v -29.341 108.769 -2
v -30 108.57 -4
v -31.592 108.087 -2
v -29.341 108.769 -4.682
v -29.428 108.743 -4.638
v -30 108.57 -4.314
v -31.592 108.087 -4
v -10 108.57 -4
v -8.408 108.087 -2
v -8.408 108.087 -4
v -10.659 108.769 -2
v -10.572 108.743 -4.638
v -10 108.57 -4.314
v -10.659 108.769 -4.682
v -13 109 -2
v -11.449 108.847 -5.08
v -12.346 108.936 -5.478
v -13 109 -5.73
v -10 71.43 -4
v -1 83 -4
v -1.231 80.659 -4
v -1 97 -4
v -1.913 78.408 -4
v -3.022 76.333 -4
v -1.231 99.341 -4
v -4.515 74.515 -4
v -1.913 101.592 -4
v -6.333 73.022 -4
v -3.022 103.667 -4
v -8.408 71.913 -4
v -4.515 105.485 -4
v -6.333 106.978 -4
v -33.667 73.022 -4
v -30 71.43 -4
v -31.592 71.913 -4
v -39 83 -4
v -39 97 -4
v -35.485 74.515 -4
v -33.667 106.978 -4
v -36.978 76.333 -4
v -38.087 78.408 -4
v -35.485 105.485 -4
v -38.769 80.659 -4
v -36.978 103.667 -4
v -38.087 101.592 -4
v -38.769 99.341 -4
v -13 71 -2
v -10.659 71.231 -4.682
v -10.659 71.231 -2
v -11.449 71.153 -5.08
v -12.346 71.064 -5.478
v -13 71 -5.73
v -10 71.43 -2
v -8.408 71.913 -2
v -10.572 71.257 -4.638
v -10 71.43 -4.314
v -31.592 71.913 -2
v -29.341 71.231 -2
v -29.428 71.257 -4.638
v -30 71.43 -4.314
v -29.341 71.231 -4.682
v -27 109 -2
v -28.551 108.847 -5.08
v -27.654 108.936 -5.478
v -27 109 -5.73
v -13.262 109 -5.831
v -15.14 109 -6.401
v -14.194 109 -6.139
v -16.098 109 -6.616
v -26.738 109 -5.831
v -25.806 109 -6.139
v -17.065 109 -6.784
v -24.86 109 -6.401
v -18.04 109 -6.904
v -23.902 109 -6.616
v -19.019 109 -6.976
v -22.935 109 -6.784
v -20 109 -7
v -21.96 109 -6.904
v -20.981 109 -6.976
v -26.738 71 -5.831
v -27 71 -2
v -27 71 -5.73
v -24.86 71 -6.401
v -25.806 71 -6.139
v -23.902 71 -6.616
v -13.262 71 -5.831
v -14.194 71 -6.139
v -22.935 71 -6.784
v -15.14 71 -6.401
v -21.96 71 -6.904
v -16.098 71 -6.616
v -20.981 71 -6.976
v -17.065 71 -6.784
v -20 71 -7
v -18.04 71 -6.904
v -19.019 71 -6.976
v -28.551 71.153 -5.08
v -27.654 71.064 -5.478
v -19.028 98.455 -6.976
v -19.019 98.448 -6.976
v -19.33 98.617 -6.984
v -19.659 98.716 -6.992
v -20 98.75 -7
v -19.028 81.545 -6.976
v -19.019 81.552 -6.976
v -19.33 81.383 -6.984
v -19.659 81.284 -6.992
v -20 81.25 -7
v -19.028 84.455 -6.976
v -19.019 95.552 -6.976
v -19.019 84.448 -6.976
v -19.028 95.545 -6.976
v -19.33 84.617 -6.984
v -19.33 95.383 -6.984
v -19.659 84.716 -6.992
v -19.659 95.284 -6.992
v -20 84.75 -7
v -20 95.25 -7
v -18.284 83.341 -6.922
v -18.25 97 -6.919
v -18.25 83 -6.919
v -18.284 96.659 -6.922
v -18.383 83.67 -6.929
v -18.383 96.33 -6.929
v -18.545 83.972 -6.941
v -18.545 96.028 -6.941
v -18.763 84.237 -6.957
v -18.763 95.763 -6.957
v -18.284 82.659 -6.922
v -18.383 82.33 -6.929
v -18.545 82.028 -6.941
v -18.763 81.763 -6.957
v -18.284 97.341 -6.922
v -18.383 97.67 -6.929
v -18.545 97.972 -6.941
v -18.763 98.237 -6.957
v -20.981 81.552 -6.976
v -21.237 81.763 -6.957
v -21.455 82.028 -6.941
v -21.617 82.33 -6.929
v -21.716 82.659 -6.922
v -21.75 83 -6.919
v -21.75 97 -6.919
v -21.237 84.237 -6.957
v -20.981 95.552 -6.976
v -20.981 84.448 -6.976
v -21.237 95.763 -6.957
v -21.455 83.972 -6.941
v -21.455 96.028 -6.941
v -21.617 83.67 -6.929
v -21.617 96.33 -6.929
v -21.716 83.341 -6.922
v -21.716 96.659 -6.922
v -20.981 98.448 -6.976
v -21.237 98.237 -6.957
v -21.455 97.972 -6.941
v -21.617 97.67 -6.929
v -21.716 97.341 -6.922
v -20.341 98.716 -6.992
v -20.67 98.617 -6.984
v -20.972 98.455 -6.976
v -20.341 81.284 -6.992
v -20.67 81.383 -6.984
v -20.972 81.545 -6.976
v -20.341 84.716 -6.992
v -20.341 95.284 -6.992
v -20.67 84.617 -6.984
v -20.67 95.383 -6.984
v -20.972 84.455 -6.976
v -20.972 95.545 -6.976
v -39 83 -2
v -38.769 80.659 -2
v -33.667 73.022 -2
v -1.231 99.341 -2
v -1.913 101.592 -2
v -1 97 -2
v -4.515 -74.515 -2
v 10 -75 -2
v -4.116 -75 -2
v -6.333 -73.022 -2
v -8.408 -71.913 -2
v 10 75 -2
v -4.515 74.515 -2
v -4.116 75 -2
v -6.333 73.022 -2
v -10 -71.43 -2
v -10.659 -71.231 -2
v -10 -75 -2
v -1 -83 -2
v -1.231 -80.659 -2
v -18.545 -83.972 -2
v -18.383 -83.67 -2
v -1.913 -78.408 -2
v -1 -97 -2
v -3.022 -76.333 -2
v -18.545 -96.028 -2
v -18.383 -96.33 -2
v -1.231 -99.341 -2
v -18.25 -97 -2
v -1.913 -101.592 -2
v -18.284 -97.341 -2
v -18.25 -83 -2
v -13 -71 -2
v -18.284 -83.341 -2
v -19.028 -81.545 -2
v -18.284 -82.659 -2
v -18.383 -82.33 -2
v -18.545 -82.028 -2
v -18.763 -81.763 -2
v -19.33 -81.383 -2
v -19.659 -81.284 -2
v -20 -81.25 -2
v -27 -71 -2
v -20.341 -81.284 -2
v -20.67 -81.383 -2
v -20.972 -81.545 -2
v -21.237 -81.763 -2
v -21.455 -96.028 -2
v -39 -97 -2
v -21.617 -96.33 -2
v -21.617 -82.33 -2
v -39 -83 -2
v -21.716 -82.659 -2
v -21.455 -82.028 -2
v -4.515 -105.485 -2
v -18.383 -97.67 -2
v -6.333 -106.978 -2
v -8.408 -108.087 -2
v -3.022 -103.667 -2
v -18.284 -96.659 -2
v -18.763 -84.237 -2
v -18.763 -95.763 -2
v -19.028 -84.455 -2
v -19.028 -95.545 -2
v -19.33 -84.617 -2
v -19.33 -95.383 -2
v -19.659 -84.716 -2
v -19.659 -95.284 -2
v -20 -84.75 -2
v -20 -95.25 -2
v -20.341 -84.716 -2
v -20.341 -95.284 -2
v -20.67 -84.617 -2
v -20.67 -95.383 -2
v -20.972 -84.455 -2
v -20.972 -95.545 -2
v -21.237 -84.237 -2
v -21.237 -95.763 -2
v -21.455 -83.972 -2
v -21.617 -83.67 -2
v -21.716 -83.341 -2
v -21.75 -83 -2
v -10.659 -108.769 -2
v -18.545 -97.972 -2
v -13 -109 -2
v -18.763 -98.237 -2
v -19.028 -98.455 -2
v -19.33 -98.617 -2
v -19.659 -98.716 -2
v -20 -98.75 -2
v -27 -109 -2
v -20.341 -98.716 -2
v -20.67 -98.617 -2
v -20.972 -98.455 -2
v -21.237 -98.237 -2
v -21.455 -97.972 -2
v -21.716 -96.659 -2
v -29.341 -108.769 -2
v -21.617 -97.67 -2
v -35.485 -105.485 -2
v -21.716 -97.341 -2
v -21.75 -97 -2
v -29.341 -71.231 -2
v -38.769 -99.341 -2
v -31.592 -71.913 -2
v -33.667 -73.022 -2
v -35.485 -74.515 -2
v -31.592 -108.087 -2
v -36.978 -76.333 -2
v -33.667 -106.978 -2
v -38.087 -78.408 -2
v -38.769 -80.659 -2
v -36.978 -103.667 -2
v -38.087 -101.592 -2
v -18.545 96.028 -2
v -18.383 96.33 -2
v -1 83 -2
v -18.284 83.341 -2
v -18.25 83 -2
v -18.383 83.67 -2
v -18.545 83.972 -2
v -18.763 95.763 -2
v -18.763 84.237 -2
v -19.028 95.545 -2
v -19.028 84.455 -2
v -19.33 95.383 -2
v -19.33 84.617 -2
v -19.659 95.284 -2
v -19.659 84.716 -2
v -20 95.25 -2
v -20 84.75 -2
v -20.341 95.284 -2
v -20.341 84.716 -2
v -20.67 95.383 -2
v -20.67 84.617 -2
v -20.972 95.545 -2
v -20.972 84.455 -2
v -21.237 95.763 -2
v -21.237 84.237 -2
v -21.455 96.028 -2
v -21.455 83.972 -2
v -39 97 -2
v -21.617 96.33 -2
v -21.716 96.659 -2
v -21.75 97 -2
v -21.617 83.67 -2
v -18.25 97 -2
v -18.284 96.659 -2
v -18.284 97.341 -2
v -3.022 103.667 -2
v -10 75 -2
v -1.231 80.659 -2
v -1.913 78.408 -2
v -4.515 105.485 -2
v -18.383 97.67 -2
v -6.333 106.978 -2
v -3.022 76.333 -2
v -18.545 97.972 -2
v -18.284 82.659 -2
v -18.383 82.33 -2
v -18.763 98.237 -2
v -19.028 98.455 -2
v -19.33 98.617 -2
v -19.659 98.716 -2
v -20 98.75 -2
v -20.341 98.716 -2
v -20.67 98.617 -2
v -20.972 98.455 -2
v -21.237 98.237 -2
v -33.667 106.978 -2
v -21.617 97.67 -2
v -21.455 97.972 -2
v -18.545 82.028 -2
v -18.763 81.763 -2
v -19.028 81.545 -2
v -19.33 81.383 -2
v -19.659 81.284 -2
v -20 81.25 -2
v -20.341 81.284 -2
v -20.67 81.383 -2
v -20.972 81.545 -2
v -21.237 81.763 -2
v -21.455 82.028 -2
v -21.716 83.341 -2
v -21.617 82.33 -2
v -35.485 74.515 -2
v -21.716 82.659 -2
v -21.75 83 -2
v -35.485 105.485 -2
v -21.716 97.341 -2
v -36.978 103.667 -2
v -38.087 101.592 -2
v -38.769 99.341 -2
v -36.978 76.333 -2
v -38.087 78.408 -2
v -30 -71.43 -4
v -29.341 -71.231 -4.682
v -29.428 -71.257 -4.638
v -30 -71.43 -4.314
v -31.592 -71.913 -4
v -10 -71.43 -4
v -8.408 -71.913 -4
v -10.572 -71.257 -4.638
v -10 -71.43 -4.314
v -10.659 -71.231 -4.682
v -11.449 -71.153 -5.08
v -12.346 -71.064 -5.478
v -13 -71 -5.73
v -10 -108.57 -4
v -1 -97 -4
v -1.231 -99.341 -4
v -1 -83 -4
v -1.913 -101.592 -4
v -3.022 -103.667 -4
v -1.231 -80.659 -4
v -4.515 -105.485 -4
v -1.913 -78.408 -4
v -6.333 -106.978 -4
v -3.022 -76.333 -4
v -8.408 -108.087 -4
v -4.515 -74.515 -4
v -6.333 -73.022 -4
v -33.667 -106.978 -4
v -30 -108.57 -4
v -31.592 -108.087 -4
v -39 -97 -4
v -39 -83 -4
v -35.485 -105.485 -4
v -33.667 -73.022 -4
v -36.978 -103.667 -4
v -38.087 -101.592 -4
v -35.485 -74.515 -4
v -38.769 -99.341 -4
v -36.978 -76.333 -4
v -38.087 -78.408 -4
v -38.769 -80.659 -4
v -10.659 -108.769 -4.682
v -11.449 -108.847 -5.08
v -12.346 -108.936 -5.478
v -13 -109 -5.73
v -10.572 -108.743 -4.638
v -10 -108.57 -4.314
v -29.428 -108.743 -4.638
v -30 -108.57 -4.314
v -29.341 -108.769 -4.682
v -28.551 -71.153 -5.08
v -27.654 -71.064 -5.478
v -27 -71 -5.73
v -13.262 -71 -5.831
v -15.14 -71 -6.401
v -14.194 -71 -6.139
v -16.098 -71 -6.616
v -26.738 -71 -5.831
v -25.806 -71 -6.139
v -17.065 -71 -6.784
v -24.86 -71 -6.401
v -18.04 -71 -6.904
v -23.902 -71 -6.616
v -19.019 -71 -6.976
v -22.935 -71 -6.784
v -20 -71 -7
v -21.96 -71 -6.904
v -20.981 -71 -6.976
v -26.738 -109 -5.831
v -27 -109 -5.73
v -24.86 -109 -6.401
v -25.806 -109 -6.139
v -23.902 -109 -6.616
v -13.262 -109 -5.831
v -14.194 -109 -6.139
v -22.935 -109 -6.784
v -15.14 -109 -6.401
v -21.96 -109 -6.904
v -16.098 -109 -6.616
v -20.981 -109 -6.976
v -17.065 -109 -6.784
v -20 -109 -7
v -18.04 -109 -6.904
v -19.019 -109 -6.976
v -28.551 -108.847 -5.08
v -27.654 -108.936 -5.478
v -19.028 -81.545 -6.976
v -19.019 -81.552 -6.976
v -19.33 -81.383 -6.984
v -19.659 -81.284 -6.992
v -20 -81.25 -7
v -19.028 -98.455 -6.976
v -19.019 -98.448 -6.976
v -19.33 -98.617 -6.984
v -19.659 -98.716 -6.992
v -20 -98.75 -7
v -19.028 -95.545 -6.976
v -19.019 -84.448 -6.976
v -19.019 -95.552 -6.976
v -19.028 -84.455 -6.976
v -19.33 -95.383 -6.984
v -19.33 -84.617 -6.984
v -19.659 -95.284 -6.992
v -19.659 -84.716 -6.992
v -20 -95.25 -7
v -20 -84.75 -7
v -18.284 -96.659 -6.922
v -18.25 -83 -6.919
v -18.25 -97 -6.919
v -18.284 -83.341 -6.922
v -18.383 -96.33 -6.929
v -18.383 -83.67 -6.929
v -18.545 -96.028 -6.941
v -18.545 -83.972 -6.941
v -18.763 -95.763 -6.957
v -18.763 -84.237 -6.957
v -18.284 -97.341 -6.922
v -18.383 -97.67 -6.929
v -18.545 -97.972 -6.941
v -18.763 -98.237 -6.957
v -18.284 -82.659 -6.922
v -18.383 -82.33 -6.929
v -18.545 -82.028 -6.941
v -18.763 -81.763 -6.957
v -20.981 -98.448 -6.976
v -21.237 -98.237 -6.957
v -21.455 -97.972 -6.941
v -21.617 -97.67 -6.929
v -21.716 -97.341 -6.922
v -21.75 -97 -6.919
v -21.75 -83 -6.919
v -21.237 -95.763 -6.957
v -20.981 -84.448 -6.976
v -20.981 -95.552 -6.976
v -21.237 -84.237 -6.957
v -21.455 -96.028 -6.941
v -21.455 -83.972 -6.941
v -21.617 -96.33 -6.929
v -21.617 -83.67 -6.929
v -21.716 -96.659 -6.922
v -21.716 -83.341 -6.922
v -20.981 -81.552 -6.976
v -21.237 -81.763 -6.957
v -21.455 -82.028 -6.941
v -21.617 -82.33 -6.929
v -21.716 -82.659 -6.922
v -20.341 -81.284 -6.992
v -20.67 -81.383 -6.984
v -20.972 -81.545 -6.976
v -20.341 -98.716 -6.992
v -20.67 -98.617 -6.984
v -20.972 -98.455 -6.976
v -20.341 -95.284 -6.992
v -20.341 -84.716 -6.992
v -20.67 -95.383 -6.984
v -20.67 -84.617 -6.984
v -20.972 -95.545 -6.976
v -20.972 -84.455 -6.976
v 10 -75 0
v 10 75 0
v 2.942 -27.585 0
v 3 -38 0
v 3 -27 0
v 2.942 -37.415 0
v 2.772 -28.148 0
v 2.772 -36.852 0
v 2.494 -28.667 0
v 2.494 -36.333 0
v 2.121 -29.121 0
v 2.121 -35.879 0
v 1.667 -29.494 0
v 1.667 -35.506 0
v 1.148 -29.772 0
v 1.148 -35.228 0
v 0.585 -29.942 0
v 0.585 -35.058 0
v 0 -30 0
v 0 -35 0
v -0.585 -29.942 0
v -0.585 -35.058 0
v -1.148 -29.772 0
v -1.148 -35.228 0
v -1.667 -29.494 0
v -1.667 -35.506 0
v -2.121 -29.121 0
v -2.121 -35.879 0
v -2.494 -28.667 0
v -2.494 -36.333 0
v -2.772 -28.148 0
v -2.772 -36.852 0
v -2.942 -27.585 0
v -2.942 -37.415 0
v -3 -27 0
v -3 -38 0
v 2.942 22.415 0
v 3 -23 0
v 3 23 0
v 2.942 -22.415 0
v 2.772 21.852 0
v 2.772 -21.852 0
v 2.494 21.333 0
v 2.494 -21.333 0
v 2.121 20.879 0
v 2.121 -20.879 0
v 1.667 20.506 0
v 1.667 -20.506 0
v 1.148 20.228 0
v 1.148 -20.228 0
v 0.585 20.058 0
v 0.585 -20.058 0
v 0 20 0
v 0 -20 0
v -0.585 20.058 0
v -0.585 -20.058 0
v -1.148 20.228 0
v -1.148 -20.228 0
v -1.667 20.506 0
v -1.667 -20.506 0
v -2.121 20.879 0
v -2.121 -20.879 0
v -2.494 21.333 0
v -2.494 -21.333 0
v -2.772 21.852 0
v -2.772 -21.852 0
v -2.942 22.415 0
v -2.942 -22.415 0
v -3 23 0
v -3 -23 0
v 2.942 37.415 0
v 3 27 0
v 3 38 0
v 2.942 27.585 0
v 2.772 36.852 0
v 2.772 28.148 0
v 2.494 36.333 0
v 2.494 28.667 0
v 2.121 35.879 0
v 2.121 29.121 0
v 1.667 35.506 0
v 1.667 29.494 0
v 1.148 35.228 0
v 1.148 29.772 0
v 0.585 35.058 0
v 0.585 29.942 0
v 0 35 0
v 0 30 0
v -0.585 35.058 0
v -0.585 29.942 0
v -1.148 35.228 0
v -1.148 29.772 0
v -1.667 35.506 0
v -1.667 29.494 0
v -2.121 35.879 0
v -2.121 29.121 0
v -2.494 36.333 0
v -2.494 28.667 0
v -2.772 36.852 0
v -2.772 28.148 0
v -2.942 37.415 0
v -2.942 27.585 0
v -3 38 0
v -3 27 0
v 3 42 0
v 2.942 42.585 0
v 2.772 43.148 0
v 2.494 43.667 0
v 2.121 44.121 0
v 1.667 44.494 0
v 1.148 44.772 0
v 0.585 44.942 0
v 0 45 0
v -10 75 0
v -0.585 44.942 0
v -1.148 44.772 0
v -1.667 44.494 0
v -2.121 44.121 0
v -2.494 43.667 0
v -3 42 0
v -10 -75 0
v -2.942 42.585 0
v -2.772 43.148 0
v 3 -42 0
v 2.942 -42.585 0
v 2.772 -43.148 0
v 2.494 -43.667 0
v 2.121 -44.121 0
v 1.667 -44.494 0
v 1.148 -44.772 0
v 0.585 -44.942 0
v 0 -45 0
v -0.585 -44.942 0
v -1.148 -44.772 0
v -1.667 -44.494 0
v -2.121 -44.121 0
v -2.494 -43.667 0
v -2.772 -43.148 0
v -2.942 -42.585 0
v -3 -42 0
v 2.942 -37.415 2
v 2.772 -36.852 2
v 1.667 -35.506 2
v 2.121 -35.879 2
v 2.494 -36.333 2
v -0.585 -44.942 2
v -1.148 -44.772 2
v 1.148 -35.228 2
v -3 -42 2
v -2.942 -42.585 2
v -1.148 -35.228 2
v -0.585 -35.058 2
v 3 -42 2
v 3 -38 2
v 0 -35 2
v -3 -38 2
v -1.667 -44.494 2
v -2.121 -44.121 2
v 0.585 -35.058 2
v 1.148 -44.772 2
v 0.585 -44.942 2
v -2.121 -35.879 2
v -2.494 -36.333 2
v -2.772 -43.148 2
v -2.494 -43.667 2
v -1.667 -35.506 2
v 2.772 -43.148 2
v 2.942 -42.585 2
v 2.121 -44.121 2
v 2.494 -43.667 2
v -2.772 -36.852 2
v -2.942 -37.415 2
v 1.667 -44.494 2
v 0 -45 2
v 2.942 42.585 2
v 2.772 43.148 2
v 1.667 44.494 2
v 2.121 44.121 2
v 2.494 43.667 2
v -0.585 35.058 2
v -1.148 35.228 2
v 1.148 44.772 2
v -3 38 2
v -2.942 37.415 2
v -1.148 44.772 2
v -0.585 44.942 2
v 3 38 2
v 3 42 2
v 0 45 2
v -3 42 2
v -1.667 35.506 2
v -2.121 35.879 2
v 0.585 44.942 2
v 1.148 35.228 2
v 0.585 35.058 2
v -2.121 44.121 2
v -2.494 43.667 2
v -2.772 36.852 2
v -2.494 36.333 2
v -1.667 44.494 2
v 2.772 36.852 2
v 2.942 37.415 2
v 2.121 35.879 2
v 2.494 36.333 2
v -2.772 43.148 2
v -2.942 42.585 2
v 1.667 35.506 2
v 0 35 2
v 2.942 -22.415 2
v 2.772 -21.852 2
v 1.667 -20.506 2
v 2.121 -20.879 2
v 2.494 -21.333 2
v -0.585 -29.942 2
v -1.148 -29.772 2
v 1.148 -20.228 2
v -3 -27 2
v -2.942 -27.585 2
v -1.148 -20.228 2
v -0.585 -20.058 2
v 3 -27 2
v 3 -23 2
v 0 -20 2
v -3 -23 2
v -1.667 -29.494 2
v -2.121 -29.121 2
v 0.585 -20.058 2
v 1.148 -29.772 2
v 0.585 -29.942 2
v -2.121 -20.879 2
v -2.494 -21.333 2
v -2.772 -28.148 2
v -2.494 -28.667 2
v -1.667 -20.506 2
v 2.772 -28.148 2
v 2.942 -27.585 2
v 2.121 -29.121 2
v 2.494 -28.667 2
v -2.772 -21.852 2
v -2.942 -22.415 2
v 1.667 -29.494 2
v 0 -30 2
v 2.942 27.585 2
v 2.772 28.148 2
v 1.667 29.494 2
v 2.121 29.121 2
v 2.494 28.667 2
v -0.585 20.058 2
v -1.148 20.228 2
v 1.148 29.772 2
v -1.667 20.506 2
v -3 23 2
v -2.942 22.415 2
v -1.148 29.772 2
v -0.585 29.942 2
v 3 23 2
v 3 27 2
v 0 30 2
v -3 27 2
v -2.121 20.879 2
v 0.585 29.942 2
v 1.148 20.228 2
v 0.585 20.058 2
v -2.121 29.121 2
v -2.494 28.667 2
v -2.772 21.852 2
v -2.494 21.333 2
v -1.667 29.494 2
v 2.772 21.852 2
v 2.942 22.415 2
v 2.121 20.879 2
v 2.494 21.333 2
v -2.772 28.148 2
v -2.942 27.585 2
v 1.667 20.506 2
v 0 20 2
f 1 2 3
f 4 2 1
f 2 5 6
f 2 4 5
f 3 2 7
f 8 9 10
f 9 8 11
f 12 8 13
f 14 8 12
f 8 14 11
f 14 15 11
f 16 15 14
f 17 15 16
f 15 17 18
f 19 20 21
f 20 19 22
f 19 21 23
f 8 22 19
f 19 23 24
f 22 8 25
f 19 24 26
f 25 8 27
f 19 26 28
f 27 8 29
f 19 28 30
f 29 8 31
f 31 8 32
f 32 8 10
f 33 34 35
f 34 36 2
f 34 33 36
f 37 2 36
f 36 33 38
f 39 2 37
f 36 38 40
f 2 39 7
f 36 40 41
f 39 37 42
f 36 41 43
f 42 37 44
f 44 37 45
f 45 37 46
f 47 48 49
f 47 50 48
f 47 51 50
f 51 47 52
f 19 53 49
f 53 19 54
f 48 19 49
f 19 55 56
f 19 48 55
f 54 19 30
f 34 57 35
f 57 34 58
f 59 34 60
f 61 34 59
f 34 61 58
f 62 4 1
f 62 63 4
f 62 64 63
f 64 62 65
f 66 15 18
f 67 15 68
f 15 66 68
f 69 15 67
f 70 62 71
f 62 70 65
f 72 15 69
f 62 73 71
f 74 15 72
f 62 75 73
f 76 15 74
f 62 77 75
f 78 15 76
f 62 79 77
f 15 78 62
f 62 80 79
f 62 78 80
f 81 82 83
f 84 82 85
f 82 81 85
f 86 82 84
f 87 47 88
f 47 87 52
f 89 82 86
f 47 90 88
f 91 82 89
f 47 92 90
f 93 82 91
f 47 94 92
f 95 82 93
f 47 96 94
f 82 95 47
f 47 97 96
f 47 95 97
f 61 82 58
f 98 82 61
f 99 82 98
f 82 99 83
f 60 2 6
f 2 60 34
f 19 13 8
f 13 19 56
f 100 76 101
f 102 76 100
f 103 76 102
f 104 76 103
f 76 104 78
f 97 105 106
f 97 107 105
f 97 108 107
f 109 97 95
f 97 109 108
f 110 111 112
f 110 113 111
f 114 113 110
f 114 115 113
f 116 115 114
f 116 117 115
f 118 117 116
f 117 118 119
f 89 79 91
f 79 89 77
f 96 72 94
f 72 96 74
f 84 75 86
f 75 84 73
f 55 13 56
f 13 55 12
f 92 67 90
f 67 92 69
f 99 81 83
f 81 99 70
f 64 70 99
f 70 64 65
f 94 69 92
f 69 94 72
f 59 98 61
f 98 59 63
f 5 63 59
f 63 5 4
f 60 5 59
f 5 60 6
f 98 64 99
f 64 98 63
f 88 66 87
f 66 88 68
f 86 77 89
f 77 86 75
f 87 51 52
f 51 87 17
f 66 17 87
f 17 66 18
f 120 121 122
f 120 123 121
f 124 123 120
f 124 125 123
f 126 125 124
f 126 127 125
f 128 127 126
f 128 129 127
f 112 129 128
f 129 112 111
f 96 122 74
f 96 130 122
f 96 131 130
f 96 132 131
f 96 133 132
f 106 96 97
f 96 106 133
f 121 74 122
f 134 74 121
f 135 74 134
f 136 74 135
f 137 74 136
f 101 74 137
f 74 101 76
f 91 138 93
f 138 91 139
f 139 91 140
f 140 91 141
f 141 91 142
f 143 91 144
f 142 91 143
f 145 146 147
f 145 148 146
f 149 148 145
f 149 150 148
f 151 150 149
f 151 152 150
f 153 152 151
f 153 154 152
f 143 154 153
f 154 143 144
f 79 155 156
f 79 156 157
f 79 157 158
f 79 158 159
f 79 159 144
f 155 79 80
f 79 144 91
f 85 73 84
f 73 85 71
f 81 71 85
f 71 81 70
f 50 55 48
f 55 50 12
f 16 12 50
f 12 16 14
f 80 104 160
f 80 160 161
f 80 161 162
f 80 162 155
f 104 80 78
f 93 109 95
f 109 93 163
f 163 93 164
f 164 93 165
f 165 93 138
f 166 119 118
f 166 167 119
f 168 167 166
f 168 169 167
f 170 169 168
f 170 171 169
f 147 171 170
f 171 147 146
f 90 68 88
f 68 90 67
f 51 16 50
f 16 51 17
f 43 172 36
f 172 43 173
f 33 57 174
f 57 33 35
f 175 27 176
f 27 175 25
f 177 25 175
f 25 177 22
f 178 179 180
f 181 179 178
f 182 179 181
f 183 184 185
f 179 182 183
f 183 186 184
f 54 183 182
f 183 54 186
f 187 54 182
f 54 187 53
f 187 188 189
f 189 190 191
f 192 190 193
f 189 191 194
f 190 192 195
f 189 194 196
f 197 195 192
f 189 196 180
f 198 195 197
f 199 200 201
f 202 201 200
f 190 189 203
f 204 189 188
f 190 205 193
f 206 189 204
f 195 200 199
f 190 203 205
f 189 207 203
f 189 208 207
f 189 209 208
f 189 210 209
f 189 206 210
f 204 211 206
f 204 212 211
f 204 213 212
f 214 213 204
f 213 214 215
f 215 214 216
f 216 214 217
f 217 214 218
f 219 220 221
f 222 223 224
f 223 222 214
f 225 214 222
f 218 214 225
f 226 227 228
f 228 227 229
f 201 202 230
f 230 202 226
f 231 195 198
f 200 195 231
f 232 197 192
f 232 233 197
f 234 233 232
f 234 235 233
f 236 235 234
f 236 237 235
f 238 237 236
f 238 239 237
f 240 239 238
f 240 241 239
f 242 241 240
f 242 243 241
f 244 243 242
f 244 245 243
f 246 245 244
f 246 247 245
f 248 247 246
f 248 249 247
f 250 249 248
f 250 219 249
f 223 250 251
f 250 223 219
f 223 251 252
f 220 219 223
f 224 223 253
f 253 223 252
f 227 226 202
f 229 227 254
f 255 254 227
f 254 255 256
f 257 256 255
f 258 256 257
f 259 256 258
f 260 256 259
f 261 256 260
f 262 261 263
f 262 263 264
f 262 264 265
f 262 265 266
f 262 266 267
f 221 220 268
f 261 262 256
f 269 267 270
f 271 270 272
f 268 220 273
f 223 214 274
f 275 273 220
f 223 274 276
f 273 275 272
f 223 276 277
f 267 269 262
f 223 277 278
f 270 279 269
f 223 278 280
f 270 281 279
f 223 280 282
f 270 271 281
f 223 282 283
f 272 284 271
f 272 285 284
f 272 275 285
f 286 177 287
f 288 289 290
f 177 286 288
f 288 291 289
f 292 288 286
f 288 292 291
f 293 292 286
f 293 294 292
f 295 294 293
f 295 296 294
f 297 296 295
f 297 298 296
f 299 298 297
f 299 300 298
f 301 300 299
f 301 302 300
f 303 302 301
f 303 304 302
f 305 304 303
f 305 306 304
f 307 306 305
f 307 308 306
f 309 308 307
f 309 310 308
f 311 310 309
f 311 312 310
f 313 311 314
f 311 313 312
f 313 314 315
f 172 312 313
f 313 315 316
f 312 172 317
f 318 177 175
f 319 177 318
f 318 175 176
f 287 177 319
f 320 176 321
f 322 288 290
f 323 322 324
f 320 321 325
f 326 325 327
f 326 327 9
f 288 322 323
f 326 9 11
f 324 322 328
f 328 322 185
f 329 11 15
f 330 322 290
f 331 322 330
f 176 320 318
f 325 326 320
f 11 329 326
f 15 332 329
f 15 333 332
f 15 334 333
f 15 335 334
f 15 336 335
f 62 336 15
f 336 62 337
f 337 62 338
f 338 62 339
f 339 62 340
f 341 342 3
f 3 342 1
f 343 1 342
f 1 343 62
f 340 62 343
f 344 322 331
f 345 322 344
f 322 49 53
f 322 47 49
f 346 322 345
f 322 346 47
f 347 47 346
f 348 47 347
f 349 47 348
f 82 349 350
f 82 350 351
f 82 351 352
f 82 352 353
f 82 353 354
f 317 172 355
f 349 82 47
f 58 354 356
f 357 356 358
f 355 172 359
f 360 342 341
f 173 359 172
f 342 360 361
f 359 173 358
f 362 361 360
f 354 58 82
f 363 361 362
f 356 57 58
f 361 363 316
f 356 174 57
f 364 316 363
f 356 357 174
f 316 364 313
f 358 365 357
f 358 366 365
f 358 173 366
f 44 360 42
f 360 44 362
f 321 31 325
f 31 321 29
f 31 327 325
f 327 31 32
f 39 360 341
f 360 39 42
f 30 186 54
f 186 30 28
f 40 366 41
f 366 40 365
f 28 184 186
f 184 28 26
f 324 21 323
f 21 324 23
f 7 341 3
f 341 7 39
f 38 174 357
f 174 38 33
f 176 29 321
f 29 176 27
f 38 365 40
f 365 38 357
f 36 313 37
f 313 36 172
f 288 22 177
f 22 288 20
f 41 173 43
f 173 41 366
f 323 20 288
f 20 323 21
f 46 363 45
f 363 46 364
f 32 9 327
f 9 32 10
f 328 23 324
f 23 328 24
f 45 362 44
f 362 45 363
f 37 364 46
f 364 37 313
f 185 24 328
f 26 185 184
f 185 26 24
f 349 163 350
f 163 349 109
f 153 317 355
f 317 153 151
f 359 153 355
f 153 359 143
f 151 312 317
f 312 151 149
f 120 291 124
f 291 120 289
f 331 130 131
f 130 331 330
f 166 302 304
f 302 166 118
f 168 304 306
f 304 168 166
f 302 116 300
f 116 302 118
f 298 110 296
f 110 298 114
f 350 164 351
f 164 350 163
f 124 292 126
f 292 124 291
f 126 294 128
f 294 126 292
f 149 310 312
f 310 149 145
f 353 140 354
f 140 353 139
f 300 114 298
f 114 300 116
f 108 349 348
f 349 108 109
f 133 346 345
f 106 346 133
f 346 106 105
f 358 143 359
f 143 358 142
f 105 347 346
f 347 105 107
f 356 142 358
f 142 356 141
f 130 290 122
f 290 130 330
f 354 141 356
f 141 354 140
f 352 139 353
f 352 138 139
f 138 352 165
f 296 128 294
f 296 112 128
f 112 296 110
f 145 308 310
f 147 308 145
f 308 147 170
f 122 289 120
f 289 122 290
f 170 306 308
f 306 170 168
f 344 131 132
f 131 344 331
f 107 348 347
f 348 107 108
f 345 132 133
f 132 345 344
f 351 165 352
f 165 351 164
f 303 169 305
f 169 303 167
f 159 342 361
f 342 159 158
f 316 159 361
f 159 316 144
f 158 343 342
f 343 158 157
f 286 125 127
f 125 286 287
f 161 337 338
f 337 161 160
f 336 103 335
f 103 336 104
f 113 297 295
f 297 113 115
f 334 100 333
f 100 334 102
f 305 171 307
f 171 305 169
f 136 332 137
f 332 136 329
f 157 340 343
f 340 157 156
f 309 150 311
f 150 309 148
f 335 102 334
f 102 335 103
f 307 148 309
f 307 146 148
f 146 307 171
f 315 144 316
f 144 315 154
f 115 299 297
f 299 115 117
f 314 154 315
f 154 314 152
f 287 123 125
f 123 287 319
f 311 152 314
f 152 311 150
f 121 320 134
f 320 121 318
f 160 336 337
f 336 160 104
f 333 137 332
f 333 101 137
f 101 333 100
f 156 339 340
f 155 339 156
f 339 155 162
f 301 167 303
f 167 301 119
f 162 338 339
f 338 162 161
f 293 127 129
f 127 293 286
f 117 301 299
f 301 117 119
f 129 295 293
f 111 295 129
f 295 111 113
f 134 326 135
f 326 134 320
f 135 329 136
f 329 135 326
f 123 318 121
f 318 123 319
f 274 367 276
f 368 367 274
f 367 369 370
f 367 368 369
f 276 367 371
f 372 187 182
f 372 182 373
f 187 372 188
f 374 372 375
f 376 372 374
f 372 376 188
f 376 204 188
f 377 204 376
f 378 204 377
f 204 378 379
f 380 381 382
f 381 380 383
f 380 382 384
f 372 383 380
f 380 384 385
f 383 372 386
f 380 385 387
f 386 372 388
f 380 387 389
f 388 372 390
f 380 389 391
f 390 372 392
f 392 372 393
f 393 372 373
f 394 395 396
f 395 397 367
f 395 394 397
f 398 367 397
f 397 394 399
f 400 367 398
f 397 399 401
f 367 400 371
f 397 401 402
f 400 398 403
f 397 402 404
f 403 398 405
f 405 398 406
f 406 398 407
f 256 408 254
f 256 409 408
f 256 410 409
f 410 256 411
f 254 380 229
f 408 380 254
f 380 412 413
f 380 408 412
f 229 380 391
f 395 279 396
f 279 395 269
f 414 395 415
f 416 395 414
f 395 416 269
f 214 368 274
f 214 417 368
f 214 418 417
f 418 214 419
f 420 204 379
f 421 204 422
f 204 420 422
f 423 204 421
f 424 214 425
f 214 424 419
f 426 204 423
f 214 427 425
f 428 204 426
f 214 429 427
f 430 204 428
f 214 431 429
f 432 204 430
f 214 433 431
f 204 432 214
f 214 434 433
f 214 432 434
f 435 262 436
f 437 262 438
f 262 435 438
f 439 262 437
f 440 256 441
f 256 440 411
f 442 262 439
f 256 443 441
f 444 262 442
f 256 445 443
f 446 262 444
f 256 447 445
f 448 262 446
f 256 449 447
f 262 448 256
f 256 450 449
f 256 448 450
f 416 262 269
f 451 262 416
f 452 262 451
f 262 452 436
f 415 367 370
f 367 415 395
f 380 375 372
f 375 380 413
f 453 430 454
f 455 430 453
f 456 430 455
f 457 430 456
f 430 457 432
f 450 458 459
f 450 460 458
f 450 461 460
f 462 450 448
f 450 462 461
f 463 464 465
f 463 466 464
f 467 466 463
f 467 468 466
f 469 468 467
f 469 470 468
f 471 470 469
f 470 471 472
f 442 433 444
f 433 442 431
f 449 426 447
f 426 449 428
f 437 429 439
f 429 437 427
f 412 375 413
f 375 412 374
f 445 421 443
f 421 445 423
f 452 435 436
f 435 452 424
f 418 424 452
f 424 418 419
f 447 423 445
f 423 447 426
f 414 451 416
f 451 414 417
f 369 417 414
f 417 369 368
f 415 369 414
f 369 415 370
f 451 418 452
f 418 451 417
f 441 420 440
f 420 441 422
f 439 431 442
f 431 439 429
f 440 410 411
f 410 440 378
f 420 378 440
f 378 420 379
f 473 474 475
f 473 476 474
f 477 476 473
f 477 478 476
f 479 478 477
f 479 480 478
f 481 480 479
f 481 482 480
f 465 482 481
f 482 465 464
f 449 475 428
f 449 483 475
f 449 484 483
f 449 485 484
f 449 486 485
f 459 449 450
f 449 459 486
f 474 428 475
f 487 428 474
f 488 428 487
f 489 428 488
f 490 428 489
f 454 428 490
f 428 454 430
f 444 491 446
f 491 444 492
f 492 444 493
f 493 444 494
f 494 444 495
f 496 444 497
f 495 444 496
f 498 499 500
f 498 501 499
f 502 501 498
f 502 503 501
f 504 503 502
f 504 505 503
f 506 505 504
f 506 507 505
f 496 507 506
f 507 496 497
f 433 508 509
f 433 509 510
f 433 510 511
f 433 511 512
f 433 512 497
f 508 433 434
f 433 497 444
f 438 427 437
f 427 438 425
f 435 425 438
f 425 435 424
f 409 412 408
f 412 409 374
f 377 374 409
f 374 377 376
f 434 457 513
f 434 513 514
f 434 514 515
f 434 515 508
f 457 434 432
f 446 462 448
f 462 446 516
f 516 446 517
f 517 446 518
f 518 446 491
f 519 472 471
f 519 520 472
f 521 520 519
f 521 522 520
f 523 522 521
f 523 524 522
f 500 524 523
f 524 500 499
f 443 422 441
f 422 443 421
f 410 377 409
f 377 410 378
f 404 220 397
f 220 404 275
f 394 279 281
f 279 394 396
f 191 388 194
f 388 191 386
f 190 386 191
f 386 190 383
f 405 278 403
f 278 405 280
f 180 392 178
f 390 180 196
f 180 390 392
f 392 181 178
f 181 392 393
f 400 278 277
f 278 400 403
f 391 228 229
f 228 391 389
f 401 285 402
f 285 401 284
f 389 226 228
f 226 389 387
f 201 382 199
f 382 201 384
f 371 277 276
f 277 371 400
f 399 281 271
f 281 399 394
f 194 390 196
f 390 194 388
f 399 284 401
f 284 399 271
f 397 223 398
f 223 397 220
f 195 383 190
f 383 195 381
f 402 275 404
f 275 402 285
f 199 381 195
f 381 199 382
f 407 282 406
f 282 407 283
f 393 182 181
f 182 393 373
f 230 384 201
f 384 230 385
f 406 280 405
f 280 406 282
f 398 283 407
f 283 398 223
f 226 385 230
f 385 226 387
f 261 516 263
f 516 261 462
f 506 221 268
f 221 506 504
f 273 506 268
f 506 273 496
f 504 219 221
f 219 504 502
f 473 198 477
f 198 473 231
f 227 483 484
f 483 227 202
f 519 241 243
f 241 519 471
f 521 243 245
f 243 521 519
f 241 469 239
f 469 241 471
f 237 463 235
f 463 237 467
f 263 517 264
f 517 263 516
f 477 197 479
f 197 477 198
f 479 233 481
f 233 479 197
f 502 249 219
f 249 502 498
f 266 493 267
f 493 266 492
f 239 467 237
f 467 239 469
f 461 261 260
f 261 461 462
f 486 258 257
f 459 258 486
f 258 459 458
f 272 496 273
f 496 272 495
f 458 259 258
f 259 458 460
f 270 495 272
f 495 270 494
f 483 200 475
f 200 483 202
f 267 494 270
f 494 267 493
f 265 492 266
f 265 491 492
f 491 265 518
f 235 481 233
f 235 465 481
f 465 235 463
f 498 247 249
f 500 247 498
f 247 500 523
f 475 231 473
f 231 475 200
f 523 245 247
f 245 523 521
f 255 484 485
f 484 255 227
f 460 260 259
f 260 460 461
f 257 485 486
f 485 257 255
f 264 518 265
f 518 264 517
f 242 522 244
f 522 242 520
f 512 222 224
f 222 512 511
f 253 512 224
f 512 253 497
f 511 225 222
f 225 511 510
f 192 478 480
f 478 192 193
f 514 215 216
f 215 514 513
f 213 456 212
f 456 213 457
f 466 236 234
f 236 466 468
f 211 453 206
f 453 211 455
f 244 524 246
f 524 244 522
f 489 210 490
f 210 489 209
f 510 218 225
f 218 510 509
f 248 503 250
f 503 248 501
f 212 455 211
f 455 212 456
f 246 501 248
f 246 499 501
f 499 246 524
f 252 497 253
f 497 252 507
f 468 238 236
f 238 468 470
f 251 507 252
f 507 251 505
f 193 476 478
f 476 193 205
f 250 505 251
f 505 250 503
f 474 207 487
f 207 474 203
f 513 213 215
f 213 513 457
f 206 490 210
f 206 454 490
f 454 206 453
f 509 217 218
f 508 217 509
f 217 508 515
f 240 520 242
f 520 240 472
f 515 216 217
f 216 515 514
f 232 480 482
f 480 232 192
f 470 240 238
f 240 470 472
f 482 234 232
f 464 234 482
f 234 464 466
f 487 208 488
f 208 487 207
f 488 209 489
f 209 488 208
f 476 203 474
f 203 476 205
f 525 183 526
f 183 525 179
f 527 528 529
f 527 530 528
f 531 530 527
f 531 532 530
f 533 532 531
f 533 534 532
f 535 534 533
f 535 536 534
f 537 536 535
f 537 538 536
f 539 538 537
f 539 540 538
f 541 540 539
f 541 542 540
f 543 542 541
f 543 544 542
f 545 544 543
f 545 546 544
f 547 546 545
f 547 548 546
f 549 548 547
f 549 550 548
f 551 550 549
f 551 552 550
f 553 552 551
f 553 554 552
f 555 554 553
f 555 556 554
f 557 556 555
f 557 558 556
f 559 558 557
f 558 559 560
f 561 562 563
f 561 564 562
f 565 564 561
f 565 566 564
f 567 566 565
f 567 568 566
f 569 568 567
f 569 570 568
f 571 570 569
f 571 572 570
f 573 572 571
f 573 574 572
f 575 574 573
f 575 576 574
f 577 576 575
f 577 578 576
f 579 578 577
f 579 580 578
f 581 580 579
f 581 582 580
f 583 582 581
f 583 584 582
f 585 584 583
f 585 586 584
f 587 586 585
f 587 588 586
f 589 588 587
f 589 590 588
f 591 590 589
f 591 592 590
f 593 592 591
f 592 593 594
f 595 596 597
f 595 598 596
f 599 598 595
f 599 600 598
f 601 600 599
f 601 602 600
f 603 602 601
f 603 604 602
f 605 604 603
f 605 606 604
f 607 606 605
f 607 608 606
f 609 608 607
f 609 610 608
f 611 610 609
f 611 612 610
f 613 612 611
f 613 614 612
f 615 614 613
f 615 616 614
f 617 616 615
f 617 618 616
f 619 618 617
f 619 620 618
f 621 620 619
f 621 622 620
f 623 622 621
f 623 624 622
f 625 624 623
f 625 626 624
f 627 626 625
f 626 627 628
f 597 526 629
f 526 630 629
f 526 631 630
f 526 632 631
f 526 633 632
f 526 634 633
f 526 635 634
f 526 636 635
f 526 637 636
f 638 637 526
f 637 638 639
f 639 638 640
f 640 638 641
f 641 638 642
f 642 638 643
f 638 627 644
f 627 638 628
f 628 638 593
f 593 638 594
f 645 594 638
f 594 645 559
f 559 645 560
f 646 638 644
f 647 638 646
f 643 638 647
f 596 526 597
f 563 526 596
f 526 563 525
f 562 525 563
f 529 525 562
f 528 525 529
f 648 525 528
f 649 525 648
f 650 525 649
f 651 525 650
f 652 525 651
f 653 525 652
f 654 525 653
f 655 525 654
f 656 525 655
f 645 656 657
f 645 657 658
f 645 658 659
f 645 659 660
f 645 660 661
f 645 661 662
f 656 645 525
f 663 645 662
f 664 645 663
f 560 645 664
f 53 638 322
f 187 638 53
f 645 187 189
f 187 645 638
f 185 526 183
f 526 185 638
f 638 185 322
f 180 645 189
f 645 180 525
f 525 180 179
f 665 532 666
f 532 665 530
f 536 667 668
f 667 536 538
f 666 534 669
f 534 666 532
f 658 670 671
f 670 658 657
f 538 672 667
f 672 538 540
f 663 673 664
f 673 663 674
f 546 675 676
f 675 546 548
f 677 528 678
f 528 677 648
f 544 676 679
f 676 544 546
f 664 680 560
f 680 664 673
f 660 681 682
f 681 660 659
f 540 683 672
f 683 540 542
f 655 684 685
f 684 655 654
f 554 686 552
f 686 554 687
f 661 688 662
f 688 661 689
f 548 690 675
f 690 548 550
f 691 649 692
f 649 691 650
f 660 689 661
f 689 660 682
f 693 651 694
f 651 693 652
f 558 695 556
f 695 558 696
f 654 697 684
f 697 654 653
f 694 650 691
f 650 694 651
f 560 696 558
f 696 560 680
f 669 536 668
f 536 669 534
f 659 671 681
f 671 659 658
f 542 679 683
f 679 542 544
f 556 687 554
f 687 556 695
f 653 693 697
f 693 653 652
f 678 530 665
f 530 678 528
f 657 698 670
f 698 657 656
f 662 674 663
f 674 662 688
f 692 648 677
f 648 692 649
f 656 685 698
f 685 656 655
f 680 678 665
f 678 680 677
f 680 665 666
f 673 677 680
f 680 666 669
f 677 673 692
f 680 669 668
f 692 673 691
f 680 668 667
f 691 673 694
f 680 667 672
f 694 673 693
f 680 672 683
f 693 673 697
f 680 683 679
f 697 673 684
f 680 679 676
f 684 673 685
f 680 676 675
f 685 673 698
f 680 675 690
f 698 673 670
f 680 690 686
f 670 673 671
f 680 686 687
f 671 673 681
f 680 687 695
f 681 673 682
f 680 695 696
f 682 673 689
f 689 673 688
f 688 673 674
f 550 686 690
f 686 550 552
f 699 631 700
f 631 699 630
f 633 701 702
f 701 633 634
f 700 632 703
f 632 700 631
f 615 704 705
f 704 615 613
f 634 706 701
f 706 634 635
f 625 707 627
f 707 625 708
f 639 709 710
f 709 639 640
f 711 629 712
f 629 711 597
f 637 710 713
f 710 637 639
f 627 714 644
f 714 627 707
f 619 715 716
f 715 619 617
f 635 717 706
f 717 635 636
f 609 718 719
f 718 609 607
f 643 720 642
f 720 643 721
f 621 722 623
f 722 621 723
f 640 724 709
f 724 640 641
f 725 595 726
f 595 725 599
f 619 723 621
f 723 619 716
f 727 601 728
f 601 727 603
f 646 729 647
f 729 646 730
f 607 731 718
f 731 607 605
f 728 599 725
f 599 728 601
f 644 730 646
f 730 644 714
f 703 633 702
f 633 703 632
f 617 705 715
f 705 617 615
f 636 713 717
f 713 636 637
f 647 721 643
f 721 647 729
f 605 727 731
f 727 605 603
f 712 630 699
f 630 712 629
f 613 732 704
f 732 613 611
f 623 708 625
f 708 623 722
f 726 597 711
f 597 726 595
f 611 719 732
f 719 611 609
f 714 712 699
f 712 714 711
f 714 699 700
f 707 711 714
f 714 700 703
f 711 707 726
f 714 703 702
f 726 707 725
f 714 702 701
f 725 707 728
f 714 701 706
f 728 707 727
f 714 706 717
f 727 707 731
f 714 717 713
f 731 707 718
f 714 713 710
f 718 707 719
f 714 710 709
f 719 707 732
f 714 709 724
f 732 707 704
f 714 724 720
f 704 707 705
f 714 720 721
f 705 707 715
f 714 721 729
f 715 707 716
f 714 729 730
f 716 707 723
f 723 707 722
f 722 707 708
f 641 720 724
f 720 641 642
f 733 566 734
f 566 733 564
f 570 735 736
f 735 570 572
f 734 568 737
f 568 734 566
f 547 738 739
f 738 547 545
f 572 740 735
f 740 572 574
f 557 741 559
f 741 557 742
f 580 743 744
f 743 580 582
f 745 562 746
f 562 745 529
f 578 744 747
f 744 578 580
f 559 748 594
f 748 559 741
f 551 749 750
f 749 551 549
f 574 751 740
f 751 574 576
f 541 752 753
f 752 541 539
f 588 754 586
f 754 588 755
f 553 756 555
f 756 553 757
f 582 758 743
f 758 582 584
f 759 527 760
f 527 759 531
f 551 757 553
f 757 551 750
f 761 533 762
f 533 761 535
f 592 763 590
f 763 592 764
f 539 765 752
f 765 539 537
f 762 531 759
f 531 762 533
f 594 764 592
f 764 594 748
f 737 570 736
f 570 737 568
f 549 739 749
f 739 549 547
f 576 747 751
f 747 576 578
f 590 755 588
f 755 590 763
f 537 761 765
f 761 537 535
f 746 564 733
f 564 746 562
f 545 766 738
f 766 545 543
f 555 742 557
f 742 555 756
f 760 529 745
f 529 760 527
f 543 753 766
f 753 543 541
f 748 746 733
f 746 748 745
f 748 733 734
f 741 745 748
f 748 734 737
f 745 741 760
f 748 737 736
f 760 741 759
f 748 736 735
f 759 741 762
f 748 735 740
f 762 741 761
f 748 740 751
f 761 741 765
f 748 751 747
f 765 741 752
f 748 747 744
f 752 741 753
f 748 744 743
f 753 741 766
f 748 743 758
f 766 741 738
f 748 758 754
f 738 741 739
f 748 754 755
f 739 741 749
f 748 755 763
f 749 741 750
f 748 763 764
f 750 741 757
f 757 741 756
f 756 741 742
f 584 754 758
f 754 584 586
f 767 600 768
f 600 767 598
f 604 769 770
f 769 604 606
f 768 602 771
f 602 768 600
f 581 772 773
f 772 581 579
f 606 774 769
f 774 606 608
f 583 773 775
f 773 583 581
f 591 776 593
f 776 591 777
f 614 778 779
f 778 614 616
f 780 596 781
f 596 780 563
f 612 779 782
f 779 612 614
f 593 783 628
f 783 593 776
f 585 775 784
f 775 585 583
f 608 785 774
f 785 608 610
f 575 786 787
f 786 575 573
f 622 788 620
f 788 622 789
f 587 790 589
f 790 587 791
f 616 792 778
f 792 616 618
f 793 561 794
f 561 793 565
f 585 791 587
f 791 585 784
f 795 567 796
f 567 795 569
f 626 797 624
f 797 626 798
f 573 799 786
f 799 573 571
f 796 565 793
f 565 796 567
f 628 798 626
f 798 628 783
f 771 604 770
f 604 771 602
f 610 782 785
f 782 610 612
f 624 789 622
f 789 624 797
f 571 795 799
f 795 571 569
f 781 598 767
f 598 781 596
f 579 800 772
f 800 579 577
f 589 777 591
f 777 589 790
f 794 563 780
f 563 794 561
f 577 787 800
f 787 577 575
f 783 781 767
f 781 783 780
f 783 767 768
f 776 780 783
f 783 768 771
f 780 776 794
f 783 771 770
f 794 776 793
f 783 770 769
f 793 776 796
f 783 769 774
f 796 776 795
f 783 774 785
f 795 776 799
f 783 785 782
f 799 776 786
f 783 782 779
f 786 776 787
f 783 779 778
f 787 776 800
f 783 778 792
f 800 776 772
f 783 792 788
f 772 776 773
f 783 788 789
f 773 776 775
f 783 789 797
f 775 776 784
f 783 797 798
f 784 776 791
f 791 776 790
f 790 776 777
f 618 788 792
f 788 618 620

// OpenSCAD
$fn=32;

// lightBracket();

bigBracket();

module bigBracket() {

  translate([-20,90,-4]) rotate([0,180,0]) lightBracket();
  translate([-20,-90,-4]) rotate([0,180,0]) lightBracket();

  translate([-10,-75,-2]) cube([20,150,2]);

  translate([0,-40,0]) backHole(2);
  translate([0,40,0]) backHole(2);

  translate([0,-25,0]) backHole(2);
  translate([0,25,0]) backHole(2);

}


module backBracket() {
  difference() {
    union() {
      translate([0,-7.5,4]) backHole(2);
      translate([0,7.5,4]) backHole(2);
      hull() {
        translate([0,-9.5,0]) cylinder(r=5,h=4);
        translate([0,9.5,0]) cylinder(r=5,h=4);
      }
    }
    translate([0,-7,-0.1]) {
      cylinder(r=1.75,h=10);
      cylinder(r=3.2,h=3.1,$fn=6);
    }
    translate([0,+7,-0.1]) {
      cylinder(r=1.75,h=10);
      cylinder(r=3.2,h=3.1,$fn=6);
    }
  }
}

module lightBracket() {
  difference() {
    base();
    translate([0,-7,-5]) cylinder(r=1.75,h=10);
    translate([0,+7,-5]) cylinder(r=1.75,h=10);
  }
}

module backHole(h) {
  hull() {
    translate([0,-2,0]) cylinder(r=3,h=h);
    translate([0,2,0]) cylinder(r=3,h=h); 
  }
}


module base() {
  r=20;
  intersection() {
    shape(10);
    translate([-10,-19,0]) cube([20,38,10]);
    translate([0,19,-r+3]) rotate([90,0,0]) cylinder(r=r,h=42,$fn=128);
  }
  
  translate([0,0,-2]) shape(2);
  //translate([-19,-19,-2]) cube([38,38,2]);
}


module shape(h) {
  cr=12;
  hull() {
    translate([19-cr,19-cr,0]) cylinder(r=cr,h=h);
    translate([-19+cr,-19+cr,0]) cylinder(r=cr,h=h);
    translate([19-cr,-19+cr,0]) cylinder(r=cr,h=h);
    translate([-19+cr,19-cr,0]) cylinder(r=cr,h=h);
  }
}
